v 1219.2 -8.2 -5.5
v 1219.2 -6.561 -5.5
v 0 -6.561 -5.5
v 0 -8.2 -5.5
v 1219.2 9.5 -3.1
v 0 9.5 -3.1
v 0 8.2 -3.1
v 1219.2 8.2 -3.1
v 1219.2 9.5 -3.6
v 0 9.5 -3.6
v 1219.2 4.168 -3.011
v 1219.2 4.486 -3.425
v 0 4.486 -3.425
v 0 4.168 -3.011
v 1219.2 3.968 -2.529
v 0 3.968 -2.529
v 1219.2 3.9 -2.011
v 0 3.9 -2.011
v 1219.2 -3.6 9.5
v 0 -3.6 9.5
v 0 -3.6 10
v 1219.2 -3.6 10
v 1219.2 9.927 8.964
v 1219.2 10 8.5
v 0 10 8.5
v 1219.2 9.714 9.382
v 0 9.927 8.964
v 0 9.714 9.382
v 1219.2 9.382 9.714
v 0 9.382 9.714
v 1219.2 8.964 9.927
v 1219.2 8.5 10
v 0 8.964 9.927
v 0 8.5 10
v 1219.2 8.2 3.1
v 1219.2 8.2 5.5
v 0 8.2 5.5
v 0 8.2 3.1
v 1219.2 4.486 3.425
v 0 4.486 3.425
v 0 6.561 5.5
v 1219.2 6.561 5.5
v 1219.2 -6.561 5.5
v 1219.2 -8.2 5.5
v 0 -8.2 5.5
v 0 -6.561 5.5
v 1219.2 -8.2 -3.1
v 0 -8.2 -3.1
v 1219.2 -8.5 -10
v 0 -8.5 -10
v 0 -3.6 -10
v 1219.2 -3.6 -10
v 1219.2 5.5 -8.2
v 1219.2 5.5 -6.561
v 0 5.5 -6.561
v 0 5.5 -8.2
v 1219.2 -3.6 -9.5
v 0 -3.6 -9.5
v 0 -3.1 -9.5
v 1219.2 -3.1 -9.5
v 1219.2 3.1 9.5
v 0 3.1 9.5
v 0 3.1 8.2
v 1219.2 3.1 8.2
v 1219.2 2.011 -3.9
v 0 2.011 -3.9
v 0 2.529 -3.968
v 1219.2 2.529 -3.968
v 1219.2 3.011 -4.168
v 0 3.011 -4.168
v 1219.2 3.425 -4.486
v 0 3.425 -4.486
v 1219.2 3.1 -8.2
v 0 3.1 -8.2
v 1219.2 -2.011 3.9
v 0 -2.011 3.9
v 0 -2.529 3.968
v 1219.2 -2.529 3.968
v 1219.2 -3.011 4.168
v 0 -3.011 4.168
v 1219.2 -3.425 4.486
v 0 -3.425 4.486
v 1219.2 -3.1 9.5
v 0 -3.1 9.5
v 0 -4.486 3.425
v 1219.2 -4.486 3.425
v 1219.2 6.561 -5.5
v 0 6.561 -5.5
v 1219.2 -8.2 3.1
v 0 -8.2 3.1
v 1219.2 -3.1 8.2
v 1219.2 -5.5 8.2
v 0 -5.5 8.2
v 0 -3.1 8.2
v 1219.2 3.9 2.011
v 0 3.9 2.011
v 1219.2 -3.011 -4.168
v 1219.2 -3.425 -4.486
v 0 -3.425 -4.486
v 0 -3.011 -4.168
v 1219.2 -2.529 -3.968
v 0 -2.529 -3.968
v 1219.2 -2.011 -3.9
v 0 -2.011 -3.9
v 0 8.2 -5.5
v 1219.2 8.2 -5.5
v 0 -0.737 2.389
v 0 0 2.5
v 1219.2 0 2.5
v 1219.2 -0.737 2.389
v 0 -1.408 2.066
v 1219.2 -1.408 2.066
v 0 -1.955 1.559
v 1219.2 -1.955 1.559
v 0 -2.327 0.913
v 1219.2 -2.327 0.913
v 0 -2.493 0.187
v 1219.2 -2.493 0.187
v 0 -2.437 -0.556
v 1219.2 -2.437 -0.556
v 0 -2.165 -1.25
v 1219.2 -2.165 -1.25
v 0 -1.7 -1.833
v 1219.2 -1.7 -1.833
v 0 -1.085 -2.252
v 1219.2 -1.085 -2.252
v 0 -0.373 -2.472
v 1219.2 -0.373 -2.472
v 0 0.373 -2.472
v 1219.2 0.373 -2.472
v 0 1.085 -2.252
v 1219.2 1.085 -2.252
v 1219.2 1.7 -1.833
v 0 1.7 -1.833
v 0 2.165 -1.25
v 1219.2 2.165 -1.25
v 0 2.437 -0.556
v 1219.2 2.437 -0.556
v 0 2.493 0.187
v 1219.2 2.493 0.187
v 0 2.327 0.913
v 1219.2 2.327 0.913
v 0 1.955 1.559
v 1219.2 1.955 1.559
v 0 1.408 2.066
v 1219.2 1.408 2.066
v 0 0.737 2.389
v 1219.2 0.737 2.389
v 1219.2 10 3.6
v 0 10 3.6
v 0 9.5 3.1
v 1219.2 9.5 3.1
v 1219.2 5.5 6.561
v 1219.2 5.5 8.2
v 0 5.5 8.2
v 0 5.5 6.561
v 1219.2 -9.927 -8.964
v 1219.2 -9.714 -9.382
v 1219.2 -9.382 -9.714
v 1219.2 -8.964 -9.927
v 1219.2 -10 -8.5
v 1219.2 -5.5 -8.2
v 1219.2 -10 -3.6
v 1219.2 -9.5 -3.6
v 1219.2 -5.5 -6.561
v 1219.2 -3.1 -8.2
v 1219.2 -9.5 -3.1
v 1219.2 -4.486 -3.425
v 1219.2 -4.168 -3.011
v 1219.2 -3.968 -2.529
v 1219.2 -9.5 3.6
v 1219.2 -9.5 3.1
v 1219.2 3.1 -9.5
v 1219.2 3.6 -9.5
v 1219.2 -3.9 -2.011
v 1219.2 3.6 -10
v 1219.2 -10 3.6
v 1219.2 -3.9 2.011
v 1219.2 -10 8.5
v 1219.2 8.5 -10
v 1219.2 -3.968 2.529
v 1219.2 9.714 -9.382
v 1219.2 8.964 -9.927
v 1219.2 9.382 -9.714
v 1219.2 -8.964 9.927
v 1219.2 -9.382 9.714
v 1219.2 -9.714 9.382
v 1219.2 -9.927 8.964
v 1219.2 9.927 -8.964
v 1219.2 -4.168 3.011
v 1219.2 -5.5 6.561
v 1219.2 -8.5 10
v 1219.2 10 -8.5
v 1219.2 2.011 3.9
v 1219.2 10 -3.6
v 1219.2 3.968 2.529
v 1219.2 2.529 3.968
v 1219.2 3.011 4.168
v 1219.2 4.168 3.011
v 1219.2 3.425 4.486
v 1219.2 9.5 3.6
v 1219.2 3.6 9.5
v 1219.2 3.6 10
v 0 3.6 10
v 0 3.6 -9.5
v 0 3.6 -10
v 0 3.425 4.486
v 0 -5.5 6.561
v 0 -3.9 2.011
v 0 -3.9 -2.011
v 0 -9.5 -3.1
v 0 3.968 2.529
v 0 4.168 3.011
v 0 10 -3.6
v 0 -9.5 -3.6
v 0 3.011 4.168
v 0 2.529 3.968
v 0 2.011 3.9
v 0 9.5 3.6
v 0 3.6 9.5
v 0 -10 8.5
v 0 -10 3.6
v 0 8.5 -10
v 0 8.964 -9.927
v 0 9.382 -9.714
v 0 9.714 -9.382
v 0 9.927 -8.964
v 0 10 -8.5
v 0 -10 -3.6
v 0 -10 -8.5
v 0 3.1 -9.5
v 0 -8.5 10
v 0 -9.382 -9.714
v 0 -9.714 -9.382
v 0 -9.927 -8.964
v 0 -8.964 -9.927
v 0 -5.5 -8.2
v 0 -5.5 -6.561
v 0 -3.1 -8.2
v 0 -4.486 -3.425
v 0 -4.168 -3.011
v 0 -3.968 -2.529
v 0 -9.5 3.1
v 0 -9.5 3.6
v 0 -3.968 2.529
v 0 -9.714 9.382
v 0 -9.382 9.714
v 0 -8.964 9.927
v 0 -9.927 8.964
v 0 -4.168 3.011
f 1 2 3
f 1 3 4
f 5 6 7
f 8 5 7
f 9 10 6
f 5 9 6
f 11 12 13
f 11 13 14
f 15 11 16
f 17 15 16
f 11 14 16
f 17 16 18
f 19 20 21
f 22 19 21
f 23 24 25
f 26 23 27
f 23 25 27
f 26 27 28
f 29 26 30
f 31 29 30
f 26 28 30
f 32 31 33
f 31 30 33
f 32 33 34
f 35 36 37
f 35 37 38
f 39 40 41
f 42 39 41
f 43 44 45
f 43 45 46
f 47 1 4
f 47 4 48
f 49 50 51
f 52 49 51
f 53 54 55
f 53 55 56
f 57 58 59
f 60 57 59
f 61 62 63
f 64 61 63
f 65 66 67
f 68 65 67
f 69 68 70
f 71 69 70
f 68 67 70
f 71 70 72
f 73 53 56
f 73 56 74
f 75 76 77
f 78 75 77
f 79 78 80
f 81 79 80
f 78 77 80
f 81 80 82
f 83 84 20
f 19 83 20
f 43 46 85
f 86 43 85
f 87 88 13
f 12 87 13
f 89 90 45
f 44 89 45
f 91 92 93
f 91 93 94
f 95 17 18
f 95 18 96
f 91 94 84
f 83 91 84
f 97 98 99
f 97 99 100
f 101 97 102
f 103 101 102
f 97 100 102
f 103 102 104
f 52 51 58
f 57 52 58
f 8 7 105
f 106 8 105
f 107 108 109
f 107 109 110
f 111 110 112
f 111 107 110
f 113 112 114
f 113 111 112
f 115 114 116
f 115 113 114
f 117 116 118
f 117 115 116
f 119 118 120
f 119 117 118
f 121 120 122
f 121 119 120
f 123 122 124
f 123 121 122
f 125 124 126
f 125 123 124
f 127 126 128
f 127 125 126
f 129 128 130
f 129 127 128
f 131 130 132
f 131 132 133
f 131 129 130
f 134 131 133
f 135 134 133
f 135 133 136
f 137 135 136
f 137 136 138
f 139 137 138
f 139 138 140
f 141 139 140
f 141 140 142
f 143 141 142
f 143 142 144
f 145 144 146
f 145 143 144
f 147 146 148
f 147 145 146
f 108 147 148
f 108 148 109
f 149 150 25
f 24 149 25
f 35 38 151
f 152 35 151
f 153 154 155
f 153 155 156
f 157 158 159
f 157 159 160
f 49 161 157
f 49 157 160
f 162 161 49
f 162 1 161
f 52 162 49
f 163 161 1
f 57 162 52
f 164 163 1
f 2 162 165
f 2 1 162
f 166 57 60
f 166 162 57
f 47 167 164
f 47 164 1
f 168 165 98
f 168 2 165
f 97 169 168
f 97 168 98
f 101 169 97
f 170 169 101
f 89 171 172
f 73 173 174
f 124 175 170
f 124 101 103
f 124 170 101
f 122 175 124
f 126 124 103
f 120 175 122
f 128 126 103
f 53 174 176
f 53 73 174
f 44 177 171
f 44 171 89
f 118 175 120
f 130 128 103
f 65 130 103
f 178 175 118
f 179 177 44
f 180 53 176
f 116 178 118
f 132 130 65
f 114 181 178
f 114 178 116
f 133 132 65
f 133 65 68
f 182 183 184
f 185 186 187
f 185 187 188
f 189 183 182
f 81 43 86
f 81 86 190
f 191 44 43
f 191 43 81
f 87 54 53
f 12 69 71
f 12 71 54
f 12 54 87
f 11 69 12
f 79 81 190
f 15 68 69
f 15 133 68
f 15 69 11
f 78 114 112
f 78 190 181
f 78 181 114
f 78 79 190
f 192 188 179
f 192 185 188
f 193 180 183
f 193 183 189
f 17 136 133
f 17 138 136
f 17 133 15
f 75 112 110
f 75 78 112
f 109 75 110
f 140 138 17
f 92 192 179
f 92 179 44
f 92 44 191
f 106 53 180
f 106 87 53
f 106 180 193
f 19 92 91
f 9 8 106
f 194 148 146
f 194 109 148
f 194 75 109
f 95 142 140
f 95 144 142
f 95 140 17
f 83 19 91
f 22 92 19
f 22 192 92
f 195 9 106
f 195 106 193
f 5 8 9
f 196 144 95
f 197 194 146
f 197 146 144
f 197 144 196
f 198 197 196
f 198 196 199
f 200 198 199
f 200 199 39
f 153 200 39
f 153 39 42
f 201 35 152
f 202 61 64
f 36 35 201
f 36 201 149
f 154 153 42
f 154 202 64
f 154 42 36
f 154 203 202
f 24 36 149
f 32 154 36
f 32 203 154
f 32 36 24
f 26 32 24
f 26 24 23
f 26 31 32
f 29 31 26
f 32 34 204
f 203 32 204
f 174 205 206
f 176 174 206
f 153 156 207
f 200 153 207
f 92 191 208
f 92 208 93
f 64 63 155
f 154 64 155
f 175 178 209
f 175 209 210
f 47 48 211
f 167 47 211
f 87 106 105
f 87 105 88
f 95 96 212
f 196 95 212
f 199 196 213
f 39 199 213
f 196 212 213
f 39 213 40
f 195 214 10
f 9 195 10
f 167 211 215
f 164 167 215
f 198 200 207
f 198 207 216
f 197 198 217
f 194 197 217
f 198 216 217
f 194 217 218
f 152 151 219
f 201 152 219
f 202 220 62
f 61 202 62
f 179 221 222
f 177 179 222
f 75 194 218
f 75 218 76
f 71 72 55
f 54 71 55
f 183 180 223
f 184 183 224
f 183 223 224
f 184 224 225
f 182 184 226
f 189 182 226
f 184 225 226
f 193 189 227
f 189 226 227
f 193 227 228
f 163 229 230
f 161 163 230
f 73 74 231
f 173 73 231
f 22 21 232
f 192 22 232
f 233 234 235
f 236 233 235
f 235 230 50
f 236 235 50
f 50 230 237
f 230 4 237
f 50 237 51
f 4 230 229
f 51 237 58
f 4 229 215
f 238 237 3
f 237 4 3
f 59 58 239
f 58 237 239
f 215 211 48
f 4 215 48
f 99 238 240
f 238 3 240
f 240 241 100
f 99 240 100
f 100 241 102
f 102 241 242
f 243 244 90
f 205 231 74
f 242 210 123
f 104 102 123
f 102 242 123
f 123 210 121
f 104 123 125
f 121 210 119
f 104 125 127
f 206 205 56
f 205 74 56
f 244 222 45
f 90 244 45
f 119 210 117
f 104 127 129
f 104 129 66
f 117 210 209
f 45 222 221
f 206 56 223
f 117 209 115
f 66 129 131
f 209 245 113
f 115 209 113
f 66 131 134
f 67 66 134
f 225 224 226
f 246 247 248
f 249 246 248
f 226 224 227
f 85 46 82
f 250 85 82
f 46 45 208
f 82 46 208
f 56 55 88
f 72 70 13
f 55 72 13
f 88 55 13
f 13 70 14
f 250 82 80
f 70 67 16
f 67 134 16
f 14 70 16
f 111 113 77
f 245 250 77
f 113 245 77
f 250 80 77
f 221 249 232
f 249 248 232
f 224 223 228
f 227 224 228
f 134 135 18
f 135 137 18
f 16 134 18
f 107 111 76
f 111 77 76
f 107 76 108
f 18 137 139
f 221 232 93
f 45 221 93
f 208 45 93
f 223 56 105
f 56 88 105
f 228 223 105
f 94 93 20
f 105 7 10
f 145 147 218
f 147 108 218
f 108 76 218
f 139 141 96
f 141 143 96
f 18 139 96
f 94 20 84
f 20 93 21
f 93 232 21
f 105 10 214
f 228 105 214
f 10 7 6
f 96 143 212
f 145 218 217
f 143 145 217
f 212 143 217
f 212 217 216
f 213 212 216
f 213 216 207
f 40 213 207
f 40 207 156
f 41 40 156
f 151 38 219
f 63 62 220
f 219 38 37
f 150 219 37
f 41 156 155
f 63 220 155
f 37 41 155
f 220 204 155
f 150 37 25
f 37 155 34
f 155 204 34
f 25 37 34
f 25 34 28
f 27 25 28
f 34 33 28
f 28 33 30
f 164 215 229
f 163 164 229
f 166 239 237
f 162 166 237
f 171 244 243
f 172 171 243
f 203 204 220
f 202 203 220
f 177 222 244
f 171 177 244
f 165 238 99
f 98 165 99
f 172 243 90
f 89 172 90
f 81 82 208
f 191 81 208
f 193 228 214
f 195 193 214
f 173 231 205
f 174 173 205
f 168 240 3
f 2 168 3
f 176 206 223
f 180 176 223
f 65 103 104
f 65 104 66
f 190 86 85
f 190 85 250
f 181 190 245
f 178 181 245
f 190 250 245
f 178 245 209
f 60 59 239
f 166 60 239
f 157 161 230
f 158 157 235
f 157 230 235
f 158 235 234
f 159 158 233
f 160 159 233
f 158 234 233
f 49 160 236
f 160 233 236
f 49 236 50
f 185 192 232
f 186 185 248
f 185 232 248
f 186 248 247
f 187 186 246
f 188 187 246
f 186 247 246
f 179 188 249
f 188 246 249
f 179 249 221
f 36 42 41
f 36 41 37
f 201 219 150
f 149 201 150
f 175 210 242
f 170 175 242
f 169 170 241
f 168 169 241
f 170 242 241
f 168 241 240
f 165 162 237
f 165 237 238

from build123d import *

# Parameters (mm, degrees)
SKETCH2_R           = 2.5
BOSS_EXTRUDE1_DEPTH = 1219.2


with BuildPart() as part:
    # Sketch2 → Boss-Extrude1 (new body)
    with BuildSketch(Plane.YZ):
        with BuildLine():
            Line((-10, 3.6), (-9.5, 3.6))
            Line((-9.5, 3.6), (-9.5, 3.1))
            Line((-9.5, 3.1), (-8.2, 3.1))
            Line((-8.2, 3.1), (-8.2, 5.5))
            Line((-8.2, 5.5), (-6.560660172, 5.5))
            Line((-6.560660172, 5.5), (-4.485786438, 3.425126266))
            ThreePointArc((-4.485786438, 3.425126266), (-4.052240935, 2.776279568), (-3.9, 2.010912703))
            Line((-3.9, 2.010912703), (-3.9, -2.010912703))
            ThreePointArc((-3.9, -2.010912703), (-4.052240935, -2.776279568), (-4.485786438, -3.425126266))
            Line((-4.485786438, -3.425126266), (-6.560660172, -5.5))
            Line((-6.560660172, -5.5), (-8.2, -5.5))
            Line((-8.2, -5.5), (-8.2, -3.1))
            Line((-8.2, -3.1), (-9.5, -3.1))
            Line((-9.5, -3.1), (-9.5, -3.6))
            Line((-9.5, -3.6), (-10, -3.6))
            Line((-10, -3.6), (-10, -8.5))
            ThreePointArc((-10, -8.5), (-9.560660172, -9.560660172), (-8.5, -10))
            Line((-8.5, -10), (-3.6, -10))
            Line((-3.6, -10), (-3.6, -9.5))
            Line((-3.6, -9.5), (-3.1, -9.5))
            Line((-3.1, -9.5), (-3.1, -8.2))
            Line((-3.1, -8.2), (-5.5, -8.2))
            Line((-5.5, -8.2), (-5.5, -6.560660172))
            Line((-5.5, -6.560660172), (-3.425126266, -4.485786438))
            ThreePointArc((-3.425126266, -4.485786438), (-2.776279568, -4.052240935), (-2.010912703, -3.9))
            Line((-2.010912703, -3.9), (2.010912703, -3.9))
            ThreePointArc((2.010912703, -3.9), (2.776279568, -4.052240935), (3.425126266, -4.485786438))
            Line((3.425126266, -4.485786438), (5.5, -6.560660172))
            Line((5.5, -6.560660172), (5.5, -8.2))
            Line((5.5, -8.2), (3.1, -8.2))
            Line((3.1, -8.2), (3.1, -9.5))
            Line((3.1, -9.5), (3.6, -9.5))
            Line((3.6, -9.5), (3.6, -10))
            Line((3.6, -10), (8.5, -10))
            ThreePointArc((8.5, -10), (9.560660172, -9.560660172), (10, -8.5))
            Line((10, -8.5), (10, -3.6))
            Line((10, -3.6), (9.5, -3.6))
            Line((9.5, -3.6), (9.5, -3.1))
            Line((9.5, -3.1), (8.2, -3.1))
            Line((8.2, -3.1), (8.2, -5.5))
            Line((8.2, -5.5), (6.560660172, -5.5))
            Line((6.560660172, -5.5), (4.485786438, -3.425126266))
            ThreePointArc((4.485786438, -3.425126266), (4.052240935, -2.776279568), (3.9, -2.010912703))
            Line((3.9, -2.010912703), (3.9, 2.010912703))
            ThreePointArc((3.9, 2.010912703), (4.052240935, 2.776279568), (4.485786438, 3.425126266))
            Line((4.485786438, 3.425126266), (6.560660172, 5.5))
            Line((6.560660172, 5.5), (8.2, 5.5))
            Line((8.2, 5.5), (8.2, 3.1))
            Line((8.2, 3.1), (9.5, 3.1))
            Line((9.5, 3.1), (9.5, 3.6))
            Line((9.5, 3.6), (10, 3.6))
            Line((10, 3.6), (10, 8.5))
            ThreePointArc((10, 8.5), (9.560660172, 9.560660172), (8.5, 10))
            Line((8.5, 10), (3.6, 10))
            Line((3.6, 10), (3.6, 9.5))
            Line((3.6, 9.5), (3.1, 9.5))
            Line((3.1, 9.5), (3.1, 8.2))
            Line((3.1, 8.2), (5.5, 8.2))
            Line((5.5, 8.2), (5.5, 6.560660172))
            Line((5.5, 6.560660172), (3.425126266, 4.485786438))
            ThreePointArc((3.425126266, 4.485786438), (2.776279568, 4.052240935), (2.010912703, 3.9))
            Line((2.010912703, 3.9), (-2.010912703, 3.9))
            ThreePointArc((-2.010912703, 3.9), (-2.776279568, 4.052240935), (-3.425126266, 4.485786438))
            Line((-3.425126266, 4.485786438), (-5.5, 6.560660172))
            Line((-5.5, 6.560660172), (-5.5, 8.2))
            Line((-5.5, 8.2), (-3.1, 8.2))
            Line((-3.1, 8.2), (-3.1, 9.5))
            Line((-3.1, 9.5), (-3.6, 9.5))
            Line((-3.6, 9.5), (-3.6, 10))
            Line((-3.6, 10), (-8.5, 10))
            ThreePointArc((-8.5, 10), (-9.560660172, 9.560660172), (-10, 8.5))
            Line((-10, 8.5), (-10, 3.6))
        make_face()
        with Locations(Location((0, 0, 0), (0, 0, 90))):
            Circle(SKETCH2_R, mode=Mode.SUBTRACT)
    extrude(amount=BOSS_EXTRUDE1_DEPTH)


solid = part.part
